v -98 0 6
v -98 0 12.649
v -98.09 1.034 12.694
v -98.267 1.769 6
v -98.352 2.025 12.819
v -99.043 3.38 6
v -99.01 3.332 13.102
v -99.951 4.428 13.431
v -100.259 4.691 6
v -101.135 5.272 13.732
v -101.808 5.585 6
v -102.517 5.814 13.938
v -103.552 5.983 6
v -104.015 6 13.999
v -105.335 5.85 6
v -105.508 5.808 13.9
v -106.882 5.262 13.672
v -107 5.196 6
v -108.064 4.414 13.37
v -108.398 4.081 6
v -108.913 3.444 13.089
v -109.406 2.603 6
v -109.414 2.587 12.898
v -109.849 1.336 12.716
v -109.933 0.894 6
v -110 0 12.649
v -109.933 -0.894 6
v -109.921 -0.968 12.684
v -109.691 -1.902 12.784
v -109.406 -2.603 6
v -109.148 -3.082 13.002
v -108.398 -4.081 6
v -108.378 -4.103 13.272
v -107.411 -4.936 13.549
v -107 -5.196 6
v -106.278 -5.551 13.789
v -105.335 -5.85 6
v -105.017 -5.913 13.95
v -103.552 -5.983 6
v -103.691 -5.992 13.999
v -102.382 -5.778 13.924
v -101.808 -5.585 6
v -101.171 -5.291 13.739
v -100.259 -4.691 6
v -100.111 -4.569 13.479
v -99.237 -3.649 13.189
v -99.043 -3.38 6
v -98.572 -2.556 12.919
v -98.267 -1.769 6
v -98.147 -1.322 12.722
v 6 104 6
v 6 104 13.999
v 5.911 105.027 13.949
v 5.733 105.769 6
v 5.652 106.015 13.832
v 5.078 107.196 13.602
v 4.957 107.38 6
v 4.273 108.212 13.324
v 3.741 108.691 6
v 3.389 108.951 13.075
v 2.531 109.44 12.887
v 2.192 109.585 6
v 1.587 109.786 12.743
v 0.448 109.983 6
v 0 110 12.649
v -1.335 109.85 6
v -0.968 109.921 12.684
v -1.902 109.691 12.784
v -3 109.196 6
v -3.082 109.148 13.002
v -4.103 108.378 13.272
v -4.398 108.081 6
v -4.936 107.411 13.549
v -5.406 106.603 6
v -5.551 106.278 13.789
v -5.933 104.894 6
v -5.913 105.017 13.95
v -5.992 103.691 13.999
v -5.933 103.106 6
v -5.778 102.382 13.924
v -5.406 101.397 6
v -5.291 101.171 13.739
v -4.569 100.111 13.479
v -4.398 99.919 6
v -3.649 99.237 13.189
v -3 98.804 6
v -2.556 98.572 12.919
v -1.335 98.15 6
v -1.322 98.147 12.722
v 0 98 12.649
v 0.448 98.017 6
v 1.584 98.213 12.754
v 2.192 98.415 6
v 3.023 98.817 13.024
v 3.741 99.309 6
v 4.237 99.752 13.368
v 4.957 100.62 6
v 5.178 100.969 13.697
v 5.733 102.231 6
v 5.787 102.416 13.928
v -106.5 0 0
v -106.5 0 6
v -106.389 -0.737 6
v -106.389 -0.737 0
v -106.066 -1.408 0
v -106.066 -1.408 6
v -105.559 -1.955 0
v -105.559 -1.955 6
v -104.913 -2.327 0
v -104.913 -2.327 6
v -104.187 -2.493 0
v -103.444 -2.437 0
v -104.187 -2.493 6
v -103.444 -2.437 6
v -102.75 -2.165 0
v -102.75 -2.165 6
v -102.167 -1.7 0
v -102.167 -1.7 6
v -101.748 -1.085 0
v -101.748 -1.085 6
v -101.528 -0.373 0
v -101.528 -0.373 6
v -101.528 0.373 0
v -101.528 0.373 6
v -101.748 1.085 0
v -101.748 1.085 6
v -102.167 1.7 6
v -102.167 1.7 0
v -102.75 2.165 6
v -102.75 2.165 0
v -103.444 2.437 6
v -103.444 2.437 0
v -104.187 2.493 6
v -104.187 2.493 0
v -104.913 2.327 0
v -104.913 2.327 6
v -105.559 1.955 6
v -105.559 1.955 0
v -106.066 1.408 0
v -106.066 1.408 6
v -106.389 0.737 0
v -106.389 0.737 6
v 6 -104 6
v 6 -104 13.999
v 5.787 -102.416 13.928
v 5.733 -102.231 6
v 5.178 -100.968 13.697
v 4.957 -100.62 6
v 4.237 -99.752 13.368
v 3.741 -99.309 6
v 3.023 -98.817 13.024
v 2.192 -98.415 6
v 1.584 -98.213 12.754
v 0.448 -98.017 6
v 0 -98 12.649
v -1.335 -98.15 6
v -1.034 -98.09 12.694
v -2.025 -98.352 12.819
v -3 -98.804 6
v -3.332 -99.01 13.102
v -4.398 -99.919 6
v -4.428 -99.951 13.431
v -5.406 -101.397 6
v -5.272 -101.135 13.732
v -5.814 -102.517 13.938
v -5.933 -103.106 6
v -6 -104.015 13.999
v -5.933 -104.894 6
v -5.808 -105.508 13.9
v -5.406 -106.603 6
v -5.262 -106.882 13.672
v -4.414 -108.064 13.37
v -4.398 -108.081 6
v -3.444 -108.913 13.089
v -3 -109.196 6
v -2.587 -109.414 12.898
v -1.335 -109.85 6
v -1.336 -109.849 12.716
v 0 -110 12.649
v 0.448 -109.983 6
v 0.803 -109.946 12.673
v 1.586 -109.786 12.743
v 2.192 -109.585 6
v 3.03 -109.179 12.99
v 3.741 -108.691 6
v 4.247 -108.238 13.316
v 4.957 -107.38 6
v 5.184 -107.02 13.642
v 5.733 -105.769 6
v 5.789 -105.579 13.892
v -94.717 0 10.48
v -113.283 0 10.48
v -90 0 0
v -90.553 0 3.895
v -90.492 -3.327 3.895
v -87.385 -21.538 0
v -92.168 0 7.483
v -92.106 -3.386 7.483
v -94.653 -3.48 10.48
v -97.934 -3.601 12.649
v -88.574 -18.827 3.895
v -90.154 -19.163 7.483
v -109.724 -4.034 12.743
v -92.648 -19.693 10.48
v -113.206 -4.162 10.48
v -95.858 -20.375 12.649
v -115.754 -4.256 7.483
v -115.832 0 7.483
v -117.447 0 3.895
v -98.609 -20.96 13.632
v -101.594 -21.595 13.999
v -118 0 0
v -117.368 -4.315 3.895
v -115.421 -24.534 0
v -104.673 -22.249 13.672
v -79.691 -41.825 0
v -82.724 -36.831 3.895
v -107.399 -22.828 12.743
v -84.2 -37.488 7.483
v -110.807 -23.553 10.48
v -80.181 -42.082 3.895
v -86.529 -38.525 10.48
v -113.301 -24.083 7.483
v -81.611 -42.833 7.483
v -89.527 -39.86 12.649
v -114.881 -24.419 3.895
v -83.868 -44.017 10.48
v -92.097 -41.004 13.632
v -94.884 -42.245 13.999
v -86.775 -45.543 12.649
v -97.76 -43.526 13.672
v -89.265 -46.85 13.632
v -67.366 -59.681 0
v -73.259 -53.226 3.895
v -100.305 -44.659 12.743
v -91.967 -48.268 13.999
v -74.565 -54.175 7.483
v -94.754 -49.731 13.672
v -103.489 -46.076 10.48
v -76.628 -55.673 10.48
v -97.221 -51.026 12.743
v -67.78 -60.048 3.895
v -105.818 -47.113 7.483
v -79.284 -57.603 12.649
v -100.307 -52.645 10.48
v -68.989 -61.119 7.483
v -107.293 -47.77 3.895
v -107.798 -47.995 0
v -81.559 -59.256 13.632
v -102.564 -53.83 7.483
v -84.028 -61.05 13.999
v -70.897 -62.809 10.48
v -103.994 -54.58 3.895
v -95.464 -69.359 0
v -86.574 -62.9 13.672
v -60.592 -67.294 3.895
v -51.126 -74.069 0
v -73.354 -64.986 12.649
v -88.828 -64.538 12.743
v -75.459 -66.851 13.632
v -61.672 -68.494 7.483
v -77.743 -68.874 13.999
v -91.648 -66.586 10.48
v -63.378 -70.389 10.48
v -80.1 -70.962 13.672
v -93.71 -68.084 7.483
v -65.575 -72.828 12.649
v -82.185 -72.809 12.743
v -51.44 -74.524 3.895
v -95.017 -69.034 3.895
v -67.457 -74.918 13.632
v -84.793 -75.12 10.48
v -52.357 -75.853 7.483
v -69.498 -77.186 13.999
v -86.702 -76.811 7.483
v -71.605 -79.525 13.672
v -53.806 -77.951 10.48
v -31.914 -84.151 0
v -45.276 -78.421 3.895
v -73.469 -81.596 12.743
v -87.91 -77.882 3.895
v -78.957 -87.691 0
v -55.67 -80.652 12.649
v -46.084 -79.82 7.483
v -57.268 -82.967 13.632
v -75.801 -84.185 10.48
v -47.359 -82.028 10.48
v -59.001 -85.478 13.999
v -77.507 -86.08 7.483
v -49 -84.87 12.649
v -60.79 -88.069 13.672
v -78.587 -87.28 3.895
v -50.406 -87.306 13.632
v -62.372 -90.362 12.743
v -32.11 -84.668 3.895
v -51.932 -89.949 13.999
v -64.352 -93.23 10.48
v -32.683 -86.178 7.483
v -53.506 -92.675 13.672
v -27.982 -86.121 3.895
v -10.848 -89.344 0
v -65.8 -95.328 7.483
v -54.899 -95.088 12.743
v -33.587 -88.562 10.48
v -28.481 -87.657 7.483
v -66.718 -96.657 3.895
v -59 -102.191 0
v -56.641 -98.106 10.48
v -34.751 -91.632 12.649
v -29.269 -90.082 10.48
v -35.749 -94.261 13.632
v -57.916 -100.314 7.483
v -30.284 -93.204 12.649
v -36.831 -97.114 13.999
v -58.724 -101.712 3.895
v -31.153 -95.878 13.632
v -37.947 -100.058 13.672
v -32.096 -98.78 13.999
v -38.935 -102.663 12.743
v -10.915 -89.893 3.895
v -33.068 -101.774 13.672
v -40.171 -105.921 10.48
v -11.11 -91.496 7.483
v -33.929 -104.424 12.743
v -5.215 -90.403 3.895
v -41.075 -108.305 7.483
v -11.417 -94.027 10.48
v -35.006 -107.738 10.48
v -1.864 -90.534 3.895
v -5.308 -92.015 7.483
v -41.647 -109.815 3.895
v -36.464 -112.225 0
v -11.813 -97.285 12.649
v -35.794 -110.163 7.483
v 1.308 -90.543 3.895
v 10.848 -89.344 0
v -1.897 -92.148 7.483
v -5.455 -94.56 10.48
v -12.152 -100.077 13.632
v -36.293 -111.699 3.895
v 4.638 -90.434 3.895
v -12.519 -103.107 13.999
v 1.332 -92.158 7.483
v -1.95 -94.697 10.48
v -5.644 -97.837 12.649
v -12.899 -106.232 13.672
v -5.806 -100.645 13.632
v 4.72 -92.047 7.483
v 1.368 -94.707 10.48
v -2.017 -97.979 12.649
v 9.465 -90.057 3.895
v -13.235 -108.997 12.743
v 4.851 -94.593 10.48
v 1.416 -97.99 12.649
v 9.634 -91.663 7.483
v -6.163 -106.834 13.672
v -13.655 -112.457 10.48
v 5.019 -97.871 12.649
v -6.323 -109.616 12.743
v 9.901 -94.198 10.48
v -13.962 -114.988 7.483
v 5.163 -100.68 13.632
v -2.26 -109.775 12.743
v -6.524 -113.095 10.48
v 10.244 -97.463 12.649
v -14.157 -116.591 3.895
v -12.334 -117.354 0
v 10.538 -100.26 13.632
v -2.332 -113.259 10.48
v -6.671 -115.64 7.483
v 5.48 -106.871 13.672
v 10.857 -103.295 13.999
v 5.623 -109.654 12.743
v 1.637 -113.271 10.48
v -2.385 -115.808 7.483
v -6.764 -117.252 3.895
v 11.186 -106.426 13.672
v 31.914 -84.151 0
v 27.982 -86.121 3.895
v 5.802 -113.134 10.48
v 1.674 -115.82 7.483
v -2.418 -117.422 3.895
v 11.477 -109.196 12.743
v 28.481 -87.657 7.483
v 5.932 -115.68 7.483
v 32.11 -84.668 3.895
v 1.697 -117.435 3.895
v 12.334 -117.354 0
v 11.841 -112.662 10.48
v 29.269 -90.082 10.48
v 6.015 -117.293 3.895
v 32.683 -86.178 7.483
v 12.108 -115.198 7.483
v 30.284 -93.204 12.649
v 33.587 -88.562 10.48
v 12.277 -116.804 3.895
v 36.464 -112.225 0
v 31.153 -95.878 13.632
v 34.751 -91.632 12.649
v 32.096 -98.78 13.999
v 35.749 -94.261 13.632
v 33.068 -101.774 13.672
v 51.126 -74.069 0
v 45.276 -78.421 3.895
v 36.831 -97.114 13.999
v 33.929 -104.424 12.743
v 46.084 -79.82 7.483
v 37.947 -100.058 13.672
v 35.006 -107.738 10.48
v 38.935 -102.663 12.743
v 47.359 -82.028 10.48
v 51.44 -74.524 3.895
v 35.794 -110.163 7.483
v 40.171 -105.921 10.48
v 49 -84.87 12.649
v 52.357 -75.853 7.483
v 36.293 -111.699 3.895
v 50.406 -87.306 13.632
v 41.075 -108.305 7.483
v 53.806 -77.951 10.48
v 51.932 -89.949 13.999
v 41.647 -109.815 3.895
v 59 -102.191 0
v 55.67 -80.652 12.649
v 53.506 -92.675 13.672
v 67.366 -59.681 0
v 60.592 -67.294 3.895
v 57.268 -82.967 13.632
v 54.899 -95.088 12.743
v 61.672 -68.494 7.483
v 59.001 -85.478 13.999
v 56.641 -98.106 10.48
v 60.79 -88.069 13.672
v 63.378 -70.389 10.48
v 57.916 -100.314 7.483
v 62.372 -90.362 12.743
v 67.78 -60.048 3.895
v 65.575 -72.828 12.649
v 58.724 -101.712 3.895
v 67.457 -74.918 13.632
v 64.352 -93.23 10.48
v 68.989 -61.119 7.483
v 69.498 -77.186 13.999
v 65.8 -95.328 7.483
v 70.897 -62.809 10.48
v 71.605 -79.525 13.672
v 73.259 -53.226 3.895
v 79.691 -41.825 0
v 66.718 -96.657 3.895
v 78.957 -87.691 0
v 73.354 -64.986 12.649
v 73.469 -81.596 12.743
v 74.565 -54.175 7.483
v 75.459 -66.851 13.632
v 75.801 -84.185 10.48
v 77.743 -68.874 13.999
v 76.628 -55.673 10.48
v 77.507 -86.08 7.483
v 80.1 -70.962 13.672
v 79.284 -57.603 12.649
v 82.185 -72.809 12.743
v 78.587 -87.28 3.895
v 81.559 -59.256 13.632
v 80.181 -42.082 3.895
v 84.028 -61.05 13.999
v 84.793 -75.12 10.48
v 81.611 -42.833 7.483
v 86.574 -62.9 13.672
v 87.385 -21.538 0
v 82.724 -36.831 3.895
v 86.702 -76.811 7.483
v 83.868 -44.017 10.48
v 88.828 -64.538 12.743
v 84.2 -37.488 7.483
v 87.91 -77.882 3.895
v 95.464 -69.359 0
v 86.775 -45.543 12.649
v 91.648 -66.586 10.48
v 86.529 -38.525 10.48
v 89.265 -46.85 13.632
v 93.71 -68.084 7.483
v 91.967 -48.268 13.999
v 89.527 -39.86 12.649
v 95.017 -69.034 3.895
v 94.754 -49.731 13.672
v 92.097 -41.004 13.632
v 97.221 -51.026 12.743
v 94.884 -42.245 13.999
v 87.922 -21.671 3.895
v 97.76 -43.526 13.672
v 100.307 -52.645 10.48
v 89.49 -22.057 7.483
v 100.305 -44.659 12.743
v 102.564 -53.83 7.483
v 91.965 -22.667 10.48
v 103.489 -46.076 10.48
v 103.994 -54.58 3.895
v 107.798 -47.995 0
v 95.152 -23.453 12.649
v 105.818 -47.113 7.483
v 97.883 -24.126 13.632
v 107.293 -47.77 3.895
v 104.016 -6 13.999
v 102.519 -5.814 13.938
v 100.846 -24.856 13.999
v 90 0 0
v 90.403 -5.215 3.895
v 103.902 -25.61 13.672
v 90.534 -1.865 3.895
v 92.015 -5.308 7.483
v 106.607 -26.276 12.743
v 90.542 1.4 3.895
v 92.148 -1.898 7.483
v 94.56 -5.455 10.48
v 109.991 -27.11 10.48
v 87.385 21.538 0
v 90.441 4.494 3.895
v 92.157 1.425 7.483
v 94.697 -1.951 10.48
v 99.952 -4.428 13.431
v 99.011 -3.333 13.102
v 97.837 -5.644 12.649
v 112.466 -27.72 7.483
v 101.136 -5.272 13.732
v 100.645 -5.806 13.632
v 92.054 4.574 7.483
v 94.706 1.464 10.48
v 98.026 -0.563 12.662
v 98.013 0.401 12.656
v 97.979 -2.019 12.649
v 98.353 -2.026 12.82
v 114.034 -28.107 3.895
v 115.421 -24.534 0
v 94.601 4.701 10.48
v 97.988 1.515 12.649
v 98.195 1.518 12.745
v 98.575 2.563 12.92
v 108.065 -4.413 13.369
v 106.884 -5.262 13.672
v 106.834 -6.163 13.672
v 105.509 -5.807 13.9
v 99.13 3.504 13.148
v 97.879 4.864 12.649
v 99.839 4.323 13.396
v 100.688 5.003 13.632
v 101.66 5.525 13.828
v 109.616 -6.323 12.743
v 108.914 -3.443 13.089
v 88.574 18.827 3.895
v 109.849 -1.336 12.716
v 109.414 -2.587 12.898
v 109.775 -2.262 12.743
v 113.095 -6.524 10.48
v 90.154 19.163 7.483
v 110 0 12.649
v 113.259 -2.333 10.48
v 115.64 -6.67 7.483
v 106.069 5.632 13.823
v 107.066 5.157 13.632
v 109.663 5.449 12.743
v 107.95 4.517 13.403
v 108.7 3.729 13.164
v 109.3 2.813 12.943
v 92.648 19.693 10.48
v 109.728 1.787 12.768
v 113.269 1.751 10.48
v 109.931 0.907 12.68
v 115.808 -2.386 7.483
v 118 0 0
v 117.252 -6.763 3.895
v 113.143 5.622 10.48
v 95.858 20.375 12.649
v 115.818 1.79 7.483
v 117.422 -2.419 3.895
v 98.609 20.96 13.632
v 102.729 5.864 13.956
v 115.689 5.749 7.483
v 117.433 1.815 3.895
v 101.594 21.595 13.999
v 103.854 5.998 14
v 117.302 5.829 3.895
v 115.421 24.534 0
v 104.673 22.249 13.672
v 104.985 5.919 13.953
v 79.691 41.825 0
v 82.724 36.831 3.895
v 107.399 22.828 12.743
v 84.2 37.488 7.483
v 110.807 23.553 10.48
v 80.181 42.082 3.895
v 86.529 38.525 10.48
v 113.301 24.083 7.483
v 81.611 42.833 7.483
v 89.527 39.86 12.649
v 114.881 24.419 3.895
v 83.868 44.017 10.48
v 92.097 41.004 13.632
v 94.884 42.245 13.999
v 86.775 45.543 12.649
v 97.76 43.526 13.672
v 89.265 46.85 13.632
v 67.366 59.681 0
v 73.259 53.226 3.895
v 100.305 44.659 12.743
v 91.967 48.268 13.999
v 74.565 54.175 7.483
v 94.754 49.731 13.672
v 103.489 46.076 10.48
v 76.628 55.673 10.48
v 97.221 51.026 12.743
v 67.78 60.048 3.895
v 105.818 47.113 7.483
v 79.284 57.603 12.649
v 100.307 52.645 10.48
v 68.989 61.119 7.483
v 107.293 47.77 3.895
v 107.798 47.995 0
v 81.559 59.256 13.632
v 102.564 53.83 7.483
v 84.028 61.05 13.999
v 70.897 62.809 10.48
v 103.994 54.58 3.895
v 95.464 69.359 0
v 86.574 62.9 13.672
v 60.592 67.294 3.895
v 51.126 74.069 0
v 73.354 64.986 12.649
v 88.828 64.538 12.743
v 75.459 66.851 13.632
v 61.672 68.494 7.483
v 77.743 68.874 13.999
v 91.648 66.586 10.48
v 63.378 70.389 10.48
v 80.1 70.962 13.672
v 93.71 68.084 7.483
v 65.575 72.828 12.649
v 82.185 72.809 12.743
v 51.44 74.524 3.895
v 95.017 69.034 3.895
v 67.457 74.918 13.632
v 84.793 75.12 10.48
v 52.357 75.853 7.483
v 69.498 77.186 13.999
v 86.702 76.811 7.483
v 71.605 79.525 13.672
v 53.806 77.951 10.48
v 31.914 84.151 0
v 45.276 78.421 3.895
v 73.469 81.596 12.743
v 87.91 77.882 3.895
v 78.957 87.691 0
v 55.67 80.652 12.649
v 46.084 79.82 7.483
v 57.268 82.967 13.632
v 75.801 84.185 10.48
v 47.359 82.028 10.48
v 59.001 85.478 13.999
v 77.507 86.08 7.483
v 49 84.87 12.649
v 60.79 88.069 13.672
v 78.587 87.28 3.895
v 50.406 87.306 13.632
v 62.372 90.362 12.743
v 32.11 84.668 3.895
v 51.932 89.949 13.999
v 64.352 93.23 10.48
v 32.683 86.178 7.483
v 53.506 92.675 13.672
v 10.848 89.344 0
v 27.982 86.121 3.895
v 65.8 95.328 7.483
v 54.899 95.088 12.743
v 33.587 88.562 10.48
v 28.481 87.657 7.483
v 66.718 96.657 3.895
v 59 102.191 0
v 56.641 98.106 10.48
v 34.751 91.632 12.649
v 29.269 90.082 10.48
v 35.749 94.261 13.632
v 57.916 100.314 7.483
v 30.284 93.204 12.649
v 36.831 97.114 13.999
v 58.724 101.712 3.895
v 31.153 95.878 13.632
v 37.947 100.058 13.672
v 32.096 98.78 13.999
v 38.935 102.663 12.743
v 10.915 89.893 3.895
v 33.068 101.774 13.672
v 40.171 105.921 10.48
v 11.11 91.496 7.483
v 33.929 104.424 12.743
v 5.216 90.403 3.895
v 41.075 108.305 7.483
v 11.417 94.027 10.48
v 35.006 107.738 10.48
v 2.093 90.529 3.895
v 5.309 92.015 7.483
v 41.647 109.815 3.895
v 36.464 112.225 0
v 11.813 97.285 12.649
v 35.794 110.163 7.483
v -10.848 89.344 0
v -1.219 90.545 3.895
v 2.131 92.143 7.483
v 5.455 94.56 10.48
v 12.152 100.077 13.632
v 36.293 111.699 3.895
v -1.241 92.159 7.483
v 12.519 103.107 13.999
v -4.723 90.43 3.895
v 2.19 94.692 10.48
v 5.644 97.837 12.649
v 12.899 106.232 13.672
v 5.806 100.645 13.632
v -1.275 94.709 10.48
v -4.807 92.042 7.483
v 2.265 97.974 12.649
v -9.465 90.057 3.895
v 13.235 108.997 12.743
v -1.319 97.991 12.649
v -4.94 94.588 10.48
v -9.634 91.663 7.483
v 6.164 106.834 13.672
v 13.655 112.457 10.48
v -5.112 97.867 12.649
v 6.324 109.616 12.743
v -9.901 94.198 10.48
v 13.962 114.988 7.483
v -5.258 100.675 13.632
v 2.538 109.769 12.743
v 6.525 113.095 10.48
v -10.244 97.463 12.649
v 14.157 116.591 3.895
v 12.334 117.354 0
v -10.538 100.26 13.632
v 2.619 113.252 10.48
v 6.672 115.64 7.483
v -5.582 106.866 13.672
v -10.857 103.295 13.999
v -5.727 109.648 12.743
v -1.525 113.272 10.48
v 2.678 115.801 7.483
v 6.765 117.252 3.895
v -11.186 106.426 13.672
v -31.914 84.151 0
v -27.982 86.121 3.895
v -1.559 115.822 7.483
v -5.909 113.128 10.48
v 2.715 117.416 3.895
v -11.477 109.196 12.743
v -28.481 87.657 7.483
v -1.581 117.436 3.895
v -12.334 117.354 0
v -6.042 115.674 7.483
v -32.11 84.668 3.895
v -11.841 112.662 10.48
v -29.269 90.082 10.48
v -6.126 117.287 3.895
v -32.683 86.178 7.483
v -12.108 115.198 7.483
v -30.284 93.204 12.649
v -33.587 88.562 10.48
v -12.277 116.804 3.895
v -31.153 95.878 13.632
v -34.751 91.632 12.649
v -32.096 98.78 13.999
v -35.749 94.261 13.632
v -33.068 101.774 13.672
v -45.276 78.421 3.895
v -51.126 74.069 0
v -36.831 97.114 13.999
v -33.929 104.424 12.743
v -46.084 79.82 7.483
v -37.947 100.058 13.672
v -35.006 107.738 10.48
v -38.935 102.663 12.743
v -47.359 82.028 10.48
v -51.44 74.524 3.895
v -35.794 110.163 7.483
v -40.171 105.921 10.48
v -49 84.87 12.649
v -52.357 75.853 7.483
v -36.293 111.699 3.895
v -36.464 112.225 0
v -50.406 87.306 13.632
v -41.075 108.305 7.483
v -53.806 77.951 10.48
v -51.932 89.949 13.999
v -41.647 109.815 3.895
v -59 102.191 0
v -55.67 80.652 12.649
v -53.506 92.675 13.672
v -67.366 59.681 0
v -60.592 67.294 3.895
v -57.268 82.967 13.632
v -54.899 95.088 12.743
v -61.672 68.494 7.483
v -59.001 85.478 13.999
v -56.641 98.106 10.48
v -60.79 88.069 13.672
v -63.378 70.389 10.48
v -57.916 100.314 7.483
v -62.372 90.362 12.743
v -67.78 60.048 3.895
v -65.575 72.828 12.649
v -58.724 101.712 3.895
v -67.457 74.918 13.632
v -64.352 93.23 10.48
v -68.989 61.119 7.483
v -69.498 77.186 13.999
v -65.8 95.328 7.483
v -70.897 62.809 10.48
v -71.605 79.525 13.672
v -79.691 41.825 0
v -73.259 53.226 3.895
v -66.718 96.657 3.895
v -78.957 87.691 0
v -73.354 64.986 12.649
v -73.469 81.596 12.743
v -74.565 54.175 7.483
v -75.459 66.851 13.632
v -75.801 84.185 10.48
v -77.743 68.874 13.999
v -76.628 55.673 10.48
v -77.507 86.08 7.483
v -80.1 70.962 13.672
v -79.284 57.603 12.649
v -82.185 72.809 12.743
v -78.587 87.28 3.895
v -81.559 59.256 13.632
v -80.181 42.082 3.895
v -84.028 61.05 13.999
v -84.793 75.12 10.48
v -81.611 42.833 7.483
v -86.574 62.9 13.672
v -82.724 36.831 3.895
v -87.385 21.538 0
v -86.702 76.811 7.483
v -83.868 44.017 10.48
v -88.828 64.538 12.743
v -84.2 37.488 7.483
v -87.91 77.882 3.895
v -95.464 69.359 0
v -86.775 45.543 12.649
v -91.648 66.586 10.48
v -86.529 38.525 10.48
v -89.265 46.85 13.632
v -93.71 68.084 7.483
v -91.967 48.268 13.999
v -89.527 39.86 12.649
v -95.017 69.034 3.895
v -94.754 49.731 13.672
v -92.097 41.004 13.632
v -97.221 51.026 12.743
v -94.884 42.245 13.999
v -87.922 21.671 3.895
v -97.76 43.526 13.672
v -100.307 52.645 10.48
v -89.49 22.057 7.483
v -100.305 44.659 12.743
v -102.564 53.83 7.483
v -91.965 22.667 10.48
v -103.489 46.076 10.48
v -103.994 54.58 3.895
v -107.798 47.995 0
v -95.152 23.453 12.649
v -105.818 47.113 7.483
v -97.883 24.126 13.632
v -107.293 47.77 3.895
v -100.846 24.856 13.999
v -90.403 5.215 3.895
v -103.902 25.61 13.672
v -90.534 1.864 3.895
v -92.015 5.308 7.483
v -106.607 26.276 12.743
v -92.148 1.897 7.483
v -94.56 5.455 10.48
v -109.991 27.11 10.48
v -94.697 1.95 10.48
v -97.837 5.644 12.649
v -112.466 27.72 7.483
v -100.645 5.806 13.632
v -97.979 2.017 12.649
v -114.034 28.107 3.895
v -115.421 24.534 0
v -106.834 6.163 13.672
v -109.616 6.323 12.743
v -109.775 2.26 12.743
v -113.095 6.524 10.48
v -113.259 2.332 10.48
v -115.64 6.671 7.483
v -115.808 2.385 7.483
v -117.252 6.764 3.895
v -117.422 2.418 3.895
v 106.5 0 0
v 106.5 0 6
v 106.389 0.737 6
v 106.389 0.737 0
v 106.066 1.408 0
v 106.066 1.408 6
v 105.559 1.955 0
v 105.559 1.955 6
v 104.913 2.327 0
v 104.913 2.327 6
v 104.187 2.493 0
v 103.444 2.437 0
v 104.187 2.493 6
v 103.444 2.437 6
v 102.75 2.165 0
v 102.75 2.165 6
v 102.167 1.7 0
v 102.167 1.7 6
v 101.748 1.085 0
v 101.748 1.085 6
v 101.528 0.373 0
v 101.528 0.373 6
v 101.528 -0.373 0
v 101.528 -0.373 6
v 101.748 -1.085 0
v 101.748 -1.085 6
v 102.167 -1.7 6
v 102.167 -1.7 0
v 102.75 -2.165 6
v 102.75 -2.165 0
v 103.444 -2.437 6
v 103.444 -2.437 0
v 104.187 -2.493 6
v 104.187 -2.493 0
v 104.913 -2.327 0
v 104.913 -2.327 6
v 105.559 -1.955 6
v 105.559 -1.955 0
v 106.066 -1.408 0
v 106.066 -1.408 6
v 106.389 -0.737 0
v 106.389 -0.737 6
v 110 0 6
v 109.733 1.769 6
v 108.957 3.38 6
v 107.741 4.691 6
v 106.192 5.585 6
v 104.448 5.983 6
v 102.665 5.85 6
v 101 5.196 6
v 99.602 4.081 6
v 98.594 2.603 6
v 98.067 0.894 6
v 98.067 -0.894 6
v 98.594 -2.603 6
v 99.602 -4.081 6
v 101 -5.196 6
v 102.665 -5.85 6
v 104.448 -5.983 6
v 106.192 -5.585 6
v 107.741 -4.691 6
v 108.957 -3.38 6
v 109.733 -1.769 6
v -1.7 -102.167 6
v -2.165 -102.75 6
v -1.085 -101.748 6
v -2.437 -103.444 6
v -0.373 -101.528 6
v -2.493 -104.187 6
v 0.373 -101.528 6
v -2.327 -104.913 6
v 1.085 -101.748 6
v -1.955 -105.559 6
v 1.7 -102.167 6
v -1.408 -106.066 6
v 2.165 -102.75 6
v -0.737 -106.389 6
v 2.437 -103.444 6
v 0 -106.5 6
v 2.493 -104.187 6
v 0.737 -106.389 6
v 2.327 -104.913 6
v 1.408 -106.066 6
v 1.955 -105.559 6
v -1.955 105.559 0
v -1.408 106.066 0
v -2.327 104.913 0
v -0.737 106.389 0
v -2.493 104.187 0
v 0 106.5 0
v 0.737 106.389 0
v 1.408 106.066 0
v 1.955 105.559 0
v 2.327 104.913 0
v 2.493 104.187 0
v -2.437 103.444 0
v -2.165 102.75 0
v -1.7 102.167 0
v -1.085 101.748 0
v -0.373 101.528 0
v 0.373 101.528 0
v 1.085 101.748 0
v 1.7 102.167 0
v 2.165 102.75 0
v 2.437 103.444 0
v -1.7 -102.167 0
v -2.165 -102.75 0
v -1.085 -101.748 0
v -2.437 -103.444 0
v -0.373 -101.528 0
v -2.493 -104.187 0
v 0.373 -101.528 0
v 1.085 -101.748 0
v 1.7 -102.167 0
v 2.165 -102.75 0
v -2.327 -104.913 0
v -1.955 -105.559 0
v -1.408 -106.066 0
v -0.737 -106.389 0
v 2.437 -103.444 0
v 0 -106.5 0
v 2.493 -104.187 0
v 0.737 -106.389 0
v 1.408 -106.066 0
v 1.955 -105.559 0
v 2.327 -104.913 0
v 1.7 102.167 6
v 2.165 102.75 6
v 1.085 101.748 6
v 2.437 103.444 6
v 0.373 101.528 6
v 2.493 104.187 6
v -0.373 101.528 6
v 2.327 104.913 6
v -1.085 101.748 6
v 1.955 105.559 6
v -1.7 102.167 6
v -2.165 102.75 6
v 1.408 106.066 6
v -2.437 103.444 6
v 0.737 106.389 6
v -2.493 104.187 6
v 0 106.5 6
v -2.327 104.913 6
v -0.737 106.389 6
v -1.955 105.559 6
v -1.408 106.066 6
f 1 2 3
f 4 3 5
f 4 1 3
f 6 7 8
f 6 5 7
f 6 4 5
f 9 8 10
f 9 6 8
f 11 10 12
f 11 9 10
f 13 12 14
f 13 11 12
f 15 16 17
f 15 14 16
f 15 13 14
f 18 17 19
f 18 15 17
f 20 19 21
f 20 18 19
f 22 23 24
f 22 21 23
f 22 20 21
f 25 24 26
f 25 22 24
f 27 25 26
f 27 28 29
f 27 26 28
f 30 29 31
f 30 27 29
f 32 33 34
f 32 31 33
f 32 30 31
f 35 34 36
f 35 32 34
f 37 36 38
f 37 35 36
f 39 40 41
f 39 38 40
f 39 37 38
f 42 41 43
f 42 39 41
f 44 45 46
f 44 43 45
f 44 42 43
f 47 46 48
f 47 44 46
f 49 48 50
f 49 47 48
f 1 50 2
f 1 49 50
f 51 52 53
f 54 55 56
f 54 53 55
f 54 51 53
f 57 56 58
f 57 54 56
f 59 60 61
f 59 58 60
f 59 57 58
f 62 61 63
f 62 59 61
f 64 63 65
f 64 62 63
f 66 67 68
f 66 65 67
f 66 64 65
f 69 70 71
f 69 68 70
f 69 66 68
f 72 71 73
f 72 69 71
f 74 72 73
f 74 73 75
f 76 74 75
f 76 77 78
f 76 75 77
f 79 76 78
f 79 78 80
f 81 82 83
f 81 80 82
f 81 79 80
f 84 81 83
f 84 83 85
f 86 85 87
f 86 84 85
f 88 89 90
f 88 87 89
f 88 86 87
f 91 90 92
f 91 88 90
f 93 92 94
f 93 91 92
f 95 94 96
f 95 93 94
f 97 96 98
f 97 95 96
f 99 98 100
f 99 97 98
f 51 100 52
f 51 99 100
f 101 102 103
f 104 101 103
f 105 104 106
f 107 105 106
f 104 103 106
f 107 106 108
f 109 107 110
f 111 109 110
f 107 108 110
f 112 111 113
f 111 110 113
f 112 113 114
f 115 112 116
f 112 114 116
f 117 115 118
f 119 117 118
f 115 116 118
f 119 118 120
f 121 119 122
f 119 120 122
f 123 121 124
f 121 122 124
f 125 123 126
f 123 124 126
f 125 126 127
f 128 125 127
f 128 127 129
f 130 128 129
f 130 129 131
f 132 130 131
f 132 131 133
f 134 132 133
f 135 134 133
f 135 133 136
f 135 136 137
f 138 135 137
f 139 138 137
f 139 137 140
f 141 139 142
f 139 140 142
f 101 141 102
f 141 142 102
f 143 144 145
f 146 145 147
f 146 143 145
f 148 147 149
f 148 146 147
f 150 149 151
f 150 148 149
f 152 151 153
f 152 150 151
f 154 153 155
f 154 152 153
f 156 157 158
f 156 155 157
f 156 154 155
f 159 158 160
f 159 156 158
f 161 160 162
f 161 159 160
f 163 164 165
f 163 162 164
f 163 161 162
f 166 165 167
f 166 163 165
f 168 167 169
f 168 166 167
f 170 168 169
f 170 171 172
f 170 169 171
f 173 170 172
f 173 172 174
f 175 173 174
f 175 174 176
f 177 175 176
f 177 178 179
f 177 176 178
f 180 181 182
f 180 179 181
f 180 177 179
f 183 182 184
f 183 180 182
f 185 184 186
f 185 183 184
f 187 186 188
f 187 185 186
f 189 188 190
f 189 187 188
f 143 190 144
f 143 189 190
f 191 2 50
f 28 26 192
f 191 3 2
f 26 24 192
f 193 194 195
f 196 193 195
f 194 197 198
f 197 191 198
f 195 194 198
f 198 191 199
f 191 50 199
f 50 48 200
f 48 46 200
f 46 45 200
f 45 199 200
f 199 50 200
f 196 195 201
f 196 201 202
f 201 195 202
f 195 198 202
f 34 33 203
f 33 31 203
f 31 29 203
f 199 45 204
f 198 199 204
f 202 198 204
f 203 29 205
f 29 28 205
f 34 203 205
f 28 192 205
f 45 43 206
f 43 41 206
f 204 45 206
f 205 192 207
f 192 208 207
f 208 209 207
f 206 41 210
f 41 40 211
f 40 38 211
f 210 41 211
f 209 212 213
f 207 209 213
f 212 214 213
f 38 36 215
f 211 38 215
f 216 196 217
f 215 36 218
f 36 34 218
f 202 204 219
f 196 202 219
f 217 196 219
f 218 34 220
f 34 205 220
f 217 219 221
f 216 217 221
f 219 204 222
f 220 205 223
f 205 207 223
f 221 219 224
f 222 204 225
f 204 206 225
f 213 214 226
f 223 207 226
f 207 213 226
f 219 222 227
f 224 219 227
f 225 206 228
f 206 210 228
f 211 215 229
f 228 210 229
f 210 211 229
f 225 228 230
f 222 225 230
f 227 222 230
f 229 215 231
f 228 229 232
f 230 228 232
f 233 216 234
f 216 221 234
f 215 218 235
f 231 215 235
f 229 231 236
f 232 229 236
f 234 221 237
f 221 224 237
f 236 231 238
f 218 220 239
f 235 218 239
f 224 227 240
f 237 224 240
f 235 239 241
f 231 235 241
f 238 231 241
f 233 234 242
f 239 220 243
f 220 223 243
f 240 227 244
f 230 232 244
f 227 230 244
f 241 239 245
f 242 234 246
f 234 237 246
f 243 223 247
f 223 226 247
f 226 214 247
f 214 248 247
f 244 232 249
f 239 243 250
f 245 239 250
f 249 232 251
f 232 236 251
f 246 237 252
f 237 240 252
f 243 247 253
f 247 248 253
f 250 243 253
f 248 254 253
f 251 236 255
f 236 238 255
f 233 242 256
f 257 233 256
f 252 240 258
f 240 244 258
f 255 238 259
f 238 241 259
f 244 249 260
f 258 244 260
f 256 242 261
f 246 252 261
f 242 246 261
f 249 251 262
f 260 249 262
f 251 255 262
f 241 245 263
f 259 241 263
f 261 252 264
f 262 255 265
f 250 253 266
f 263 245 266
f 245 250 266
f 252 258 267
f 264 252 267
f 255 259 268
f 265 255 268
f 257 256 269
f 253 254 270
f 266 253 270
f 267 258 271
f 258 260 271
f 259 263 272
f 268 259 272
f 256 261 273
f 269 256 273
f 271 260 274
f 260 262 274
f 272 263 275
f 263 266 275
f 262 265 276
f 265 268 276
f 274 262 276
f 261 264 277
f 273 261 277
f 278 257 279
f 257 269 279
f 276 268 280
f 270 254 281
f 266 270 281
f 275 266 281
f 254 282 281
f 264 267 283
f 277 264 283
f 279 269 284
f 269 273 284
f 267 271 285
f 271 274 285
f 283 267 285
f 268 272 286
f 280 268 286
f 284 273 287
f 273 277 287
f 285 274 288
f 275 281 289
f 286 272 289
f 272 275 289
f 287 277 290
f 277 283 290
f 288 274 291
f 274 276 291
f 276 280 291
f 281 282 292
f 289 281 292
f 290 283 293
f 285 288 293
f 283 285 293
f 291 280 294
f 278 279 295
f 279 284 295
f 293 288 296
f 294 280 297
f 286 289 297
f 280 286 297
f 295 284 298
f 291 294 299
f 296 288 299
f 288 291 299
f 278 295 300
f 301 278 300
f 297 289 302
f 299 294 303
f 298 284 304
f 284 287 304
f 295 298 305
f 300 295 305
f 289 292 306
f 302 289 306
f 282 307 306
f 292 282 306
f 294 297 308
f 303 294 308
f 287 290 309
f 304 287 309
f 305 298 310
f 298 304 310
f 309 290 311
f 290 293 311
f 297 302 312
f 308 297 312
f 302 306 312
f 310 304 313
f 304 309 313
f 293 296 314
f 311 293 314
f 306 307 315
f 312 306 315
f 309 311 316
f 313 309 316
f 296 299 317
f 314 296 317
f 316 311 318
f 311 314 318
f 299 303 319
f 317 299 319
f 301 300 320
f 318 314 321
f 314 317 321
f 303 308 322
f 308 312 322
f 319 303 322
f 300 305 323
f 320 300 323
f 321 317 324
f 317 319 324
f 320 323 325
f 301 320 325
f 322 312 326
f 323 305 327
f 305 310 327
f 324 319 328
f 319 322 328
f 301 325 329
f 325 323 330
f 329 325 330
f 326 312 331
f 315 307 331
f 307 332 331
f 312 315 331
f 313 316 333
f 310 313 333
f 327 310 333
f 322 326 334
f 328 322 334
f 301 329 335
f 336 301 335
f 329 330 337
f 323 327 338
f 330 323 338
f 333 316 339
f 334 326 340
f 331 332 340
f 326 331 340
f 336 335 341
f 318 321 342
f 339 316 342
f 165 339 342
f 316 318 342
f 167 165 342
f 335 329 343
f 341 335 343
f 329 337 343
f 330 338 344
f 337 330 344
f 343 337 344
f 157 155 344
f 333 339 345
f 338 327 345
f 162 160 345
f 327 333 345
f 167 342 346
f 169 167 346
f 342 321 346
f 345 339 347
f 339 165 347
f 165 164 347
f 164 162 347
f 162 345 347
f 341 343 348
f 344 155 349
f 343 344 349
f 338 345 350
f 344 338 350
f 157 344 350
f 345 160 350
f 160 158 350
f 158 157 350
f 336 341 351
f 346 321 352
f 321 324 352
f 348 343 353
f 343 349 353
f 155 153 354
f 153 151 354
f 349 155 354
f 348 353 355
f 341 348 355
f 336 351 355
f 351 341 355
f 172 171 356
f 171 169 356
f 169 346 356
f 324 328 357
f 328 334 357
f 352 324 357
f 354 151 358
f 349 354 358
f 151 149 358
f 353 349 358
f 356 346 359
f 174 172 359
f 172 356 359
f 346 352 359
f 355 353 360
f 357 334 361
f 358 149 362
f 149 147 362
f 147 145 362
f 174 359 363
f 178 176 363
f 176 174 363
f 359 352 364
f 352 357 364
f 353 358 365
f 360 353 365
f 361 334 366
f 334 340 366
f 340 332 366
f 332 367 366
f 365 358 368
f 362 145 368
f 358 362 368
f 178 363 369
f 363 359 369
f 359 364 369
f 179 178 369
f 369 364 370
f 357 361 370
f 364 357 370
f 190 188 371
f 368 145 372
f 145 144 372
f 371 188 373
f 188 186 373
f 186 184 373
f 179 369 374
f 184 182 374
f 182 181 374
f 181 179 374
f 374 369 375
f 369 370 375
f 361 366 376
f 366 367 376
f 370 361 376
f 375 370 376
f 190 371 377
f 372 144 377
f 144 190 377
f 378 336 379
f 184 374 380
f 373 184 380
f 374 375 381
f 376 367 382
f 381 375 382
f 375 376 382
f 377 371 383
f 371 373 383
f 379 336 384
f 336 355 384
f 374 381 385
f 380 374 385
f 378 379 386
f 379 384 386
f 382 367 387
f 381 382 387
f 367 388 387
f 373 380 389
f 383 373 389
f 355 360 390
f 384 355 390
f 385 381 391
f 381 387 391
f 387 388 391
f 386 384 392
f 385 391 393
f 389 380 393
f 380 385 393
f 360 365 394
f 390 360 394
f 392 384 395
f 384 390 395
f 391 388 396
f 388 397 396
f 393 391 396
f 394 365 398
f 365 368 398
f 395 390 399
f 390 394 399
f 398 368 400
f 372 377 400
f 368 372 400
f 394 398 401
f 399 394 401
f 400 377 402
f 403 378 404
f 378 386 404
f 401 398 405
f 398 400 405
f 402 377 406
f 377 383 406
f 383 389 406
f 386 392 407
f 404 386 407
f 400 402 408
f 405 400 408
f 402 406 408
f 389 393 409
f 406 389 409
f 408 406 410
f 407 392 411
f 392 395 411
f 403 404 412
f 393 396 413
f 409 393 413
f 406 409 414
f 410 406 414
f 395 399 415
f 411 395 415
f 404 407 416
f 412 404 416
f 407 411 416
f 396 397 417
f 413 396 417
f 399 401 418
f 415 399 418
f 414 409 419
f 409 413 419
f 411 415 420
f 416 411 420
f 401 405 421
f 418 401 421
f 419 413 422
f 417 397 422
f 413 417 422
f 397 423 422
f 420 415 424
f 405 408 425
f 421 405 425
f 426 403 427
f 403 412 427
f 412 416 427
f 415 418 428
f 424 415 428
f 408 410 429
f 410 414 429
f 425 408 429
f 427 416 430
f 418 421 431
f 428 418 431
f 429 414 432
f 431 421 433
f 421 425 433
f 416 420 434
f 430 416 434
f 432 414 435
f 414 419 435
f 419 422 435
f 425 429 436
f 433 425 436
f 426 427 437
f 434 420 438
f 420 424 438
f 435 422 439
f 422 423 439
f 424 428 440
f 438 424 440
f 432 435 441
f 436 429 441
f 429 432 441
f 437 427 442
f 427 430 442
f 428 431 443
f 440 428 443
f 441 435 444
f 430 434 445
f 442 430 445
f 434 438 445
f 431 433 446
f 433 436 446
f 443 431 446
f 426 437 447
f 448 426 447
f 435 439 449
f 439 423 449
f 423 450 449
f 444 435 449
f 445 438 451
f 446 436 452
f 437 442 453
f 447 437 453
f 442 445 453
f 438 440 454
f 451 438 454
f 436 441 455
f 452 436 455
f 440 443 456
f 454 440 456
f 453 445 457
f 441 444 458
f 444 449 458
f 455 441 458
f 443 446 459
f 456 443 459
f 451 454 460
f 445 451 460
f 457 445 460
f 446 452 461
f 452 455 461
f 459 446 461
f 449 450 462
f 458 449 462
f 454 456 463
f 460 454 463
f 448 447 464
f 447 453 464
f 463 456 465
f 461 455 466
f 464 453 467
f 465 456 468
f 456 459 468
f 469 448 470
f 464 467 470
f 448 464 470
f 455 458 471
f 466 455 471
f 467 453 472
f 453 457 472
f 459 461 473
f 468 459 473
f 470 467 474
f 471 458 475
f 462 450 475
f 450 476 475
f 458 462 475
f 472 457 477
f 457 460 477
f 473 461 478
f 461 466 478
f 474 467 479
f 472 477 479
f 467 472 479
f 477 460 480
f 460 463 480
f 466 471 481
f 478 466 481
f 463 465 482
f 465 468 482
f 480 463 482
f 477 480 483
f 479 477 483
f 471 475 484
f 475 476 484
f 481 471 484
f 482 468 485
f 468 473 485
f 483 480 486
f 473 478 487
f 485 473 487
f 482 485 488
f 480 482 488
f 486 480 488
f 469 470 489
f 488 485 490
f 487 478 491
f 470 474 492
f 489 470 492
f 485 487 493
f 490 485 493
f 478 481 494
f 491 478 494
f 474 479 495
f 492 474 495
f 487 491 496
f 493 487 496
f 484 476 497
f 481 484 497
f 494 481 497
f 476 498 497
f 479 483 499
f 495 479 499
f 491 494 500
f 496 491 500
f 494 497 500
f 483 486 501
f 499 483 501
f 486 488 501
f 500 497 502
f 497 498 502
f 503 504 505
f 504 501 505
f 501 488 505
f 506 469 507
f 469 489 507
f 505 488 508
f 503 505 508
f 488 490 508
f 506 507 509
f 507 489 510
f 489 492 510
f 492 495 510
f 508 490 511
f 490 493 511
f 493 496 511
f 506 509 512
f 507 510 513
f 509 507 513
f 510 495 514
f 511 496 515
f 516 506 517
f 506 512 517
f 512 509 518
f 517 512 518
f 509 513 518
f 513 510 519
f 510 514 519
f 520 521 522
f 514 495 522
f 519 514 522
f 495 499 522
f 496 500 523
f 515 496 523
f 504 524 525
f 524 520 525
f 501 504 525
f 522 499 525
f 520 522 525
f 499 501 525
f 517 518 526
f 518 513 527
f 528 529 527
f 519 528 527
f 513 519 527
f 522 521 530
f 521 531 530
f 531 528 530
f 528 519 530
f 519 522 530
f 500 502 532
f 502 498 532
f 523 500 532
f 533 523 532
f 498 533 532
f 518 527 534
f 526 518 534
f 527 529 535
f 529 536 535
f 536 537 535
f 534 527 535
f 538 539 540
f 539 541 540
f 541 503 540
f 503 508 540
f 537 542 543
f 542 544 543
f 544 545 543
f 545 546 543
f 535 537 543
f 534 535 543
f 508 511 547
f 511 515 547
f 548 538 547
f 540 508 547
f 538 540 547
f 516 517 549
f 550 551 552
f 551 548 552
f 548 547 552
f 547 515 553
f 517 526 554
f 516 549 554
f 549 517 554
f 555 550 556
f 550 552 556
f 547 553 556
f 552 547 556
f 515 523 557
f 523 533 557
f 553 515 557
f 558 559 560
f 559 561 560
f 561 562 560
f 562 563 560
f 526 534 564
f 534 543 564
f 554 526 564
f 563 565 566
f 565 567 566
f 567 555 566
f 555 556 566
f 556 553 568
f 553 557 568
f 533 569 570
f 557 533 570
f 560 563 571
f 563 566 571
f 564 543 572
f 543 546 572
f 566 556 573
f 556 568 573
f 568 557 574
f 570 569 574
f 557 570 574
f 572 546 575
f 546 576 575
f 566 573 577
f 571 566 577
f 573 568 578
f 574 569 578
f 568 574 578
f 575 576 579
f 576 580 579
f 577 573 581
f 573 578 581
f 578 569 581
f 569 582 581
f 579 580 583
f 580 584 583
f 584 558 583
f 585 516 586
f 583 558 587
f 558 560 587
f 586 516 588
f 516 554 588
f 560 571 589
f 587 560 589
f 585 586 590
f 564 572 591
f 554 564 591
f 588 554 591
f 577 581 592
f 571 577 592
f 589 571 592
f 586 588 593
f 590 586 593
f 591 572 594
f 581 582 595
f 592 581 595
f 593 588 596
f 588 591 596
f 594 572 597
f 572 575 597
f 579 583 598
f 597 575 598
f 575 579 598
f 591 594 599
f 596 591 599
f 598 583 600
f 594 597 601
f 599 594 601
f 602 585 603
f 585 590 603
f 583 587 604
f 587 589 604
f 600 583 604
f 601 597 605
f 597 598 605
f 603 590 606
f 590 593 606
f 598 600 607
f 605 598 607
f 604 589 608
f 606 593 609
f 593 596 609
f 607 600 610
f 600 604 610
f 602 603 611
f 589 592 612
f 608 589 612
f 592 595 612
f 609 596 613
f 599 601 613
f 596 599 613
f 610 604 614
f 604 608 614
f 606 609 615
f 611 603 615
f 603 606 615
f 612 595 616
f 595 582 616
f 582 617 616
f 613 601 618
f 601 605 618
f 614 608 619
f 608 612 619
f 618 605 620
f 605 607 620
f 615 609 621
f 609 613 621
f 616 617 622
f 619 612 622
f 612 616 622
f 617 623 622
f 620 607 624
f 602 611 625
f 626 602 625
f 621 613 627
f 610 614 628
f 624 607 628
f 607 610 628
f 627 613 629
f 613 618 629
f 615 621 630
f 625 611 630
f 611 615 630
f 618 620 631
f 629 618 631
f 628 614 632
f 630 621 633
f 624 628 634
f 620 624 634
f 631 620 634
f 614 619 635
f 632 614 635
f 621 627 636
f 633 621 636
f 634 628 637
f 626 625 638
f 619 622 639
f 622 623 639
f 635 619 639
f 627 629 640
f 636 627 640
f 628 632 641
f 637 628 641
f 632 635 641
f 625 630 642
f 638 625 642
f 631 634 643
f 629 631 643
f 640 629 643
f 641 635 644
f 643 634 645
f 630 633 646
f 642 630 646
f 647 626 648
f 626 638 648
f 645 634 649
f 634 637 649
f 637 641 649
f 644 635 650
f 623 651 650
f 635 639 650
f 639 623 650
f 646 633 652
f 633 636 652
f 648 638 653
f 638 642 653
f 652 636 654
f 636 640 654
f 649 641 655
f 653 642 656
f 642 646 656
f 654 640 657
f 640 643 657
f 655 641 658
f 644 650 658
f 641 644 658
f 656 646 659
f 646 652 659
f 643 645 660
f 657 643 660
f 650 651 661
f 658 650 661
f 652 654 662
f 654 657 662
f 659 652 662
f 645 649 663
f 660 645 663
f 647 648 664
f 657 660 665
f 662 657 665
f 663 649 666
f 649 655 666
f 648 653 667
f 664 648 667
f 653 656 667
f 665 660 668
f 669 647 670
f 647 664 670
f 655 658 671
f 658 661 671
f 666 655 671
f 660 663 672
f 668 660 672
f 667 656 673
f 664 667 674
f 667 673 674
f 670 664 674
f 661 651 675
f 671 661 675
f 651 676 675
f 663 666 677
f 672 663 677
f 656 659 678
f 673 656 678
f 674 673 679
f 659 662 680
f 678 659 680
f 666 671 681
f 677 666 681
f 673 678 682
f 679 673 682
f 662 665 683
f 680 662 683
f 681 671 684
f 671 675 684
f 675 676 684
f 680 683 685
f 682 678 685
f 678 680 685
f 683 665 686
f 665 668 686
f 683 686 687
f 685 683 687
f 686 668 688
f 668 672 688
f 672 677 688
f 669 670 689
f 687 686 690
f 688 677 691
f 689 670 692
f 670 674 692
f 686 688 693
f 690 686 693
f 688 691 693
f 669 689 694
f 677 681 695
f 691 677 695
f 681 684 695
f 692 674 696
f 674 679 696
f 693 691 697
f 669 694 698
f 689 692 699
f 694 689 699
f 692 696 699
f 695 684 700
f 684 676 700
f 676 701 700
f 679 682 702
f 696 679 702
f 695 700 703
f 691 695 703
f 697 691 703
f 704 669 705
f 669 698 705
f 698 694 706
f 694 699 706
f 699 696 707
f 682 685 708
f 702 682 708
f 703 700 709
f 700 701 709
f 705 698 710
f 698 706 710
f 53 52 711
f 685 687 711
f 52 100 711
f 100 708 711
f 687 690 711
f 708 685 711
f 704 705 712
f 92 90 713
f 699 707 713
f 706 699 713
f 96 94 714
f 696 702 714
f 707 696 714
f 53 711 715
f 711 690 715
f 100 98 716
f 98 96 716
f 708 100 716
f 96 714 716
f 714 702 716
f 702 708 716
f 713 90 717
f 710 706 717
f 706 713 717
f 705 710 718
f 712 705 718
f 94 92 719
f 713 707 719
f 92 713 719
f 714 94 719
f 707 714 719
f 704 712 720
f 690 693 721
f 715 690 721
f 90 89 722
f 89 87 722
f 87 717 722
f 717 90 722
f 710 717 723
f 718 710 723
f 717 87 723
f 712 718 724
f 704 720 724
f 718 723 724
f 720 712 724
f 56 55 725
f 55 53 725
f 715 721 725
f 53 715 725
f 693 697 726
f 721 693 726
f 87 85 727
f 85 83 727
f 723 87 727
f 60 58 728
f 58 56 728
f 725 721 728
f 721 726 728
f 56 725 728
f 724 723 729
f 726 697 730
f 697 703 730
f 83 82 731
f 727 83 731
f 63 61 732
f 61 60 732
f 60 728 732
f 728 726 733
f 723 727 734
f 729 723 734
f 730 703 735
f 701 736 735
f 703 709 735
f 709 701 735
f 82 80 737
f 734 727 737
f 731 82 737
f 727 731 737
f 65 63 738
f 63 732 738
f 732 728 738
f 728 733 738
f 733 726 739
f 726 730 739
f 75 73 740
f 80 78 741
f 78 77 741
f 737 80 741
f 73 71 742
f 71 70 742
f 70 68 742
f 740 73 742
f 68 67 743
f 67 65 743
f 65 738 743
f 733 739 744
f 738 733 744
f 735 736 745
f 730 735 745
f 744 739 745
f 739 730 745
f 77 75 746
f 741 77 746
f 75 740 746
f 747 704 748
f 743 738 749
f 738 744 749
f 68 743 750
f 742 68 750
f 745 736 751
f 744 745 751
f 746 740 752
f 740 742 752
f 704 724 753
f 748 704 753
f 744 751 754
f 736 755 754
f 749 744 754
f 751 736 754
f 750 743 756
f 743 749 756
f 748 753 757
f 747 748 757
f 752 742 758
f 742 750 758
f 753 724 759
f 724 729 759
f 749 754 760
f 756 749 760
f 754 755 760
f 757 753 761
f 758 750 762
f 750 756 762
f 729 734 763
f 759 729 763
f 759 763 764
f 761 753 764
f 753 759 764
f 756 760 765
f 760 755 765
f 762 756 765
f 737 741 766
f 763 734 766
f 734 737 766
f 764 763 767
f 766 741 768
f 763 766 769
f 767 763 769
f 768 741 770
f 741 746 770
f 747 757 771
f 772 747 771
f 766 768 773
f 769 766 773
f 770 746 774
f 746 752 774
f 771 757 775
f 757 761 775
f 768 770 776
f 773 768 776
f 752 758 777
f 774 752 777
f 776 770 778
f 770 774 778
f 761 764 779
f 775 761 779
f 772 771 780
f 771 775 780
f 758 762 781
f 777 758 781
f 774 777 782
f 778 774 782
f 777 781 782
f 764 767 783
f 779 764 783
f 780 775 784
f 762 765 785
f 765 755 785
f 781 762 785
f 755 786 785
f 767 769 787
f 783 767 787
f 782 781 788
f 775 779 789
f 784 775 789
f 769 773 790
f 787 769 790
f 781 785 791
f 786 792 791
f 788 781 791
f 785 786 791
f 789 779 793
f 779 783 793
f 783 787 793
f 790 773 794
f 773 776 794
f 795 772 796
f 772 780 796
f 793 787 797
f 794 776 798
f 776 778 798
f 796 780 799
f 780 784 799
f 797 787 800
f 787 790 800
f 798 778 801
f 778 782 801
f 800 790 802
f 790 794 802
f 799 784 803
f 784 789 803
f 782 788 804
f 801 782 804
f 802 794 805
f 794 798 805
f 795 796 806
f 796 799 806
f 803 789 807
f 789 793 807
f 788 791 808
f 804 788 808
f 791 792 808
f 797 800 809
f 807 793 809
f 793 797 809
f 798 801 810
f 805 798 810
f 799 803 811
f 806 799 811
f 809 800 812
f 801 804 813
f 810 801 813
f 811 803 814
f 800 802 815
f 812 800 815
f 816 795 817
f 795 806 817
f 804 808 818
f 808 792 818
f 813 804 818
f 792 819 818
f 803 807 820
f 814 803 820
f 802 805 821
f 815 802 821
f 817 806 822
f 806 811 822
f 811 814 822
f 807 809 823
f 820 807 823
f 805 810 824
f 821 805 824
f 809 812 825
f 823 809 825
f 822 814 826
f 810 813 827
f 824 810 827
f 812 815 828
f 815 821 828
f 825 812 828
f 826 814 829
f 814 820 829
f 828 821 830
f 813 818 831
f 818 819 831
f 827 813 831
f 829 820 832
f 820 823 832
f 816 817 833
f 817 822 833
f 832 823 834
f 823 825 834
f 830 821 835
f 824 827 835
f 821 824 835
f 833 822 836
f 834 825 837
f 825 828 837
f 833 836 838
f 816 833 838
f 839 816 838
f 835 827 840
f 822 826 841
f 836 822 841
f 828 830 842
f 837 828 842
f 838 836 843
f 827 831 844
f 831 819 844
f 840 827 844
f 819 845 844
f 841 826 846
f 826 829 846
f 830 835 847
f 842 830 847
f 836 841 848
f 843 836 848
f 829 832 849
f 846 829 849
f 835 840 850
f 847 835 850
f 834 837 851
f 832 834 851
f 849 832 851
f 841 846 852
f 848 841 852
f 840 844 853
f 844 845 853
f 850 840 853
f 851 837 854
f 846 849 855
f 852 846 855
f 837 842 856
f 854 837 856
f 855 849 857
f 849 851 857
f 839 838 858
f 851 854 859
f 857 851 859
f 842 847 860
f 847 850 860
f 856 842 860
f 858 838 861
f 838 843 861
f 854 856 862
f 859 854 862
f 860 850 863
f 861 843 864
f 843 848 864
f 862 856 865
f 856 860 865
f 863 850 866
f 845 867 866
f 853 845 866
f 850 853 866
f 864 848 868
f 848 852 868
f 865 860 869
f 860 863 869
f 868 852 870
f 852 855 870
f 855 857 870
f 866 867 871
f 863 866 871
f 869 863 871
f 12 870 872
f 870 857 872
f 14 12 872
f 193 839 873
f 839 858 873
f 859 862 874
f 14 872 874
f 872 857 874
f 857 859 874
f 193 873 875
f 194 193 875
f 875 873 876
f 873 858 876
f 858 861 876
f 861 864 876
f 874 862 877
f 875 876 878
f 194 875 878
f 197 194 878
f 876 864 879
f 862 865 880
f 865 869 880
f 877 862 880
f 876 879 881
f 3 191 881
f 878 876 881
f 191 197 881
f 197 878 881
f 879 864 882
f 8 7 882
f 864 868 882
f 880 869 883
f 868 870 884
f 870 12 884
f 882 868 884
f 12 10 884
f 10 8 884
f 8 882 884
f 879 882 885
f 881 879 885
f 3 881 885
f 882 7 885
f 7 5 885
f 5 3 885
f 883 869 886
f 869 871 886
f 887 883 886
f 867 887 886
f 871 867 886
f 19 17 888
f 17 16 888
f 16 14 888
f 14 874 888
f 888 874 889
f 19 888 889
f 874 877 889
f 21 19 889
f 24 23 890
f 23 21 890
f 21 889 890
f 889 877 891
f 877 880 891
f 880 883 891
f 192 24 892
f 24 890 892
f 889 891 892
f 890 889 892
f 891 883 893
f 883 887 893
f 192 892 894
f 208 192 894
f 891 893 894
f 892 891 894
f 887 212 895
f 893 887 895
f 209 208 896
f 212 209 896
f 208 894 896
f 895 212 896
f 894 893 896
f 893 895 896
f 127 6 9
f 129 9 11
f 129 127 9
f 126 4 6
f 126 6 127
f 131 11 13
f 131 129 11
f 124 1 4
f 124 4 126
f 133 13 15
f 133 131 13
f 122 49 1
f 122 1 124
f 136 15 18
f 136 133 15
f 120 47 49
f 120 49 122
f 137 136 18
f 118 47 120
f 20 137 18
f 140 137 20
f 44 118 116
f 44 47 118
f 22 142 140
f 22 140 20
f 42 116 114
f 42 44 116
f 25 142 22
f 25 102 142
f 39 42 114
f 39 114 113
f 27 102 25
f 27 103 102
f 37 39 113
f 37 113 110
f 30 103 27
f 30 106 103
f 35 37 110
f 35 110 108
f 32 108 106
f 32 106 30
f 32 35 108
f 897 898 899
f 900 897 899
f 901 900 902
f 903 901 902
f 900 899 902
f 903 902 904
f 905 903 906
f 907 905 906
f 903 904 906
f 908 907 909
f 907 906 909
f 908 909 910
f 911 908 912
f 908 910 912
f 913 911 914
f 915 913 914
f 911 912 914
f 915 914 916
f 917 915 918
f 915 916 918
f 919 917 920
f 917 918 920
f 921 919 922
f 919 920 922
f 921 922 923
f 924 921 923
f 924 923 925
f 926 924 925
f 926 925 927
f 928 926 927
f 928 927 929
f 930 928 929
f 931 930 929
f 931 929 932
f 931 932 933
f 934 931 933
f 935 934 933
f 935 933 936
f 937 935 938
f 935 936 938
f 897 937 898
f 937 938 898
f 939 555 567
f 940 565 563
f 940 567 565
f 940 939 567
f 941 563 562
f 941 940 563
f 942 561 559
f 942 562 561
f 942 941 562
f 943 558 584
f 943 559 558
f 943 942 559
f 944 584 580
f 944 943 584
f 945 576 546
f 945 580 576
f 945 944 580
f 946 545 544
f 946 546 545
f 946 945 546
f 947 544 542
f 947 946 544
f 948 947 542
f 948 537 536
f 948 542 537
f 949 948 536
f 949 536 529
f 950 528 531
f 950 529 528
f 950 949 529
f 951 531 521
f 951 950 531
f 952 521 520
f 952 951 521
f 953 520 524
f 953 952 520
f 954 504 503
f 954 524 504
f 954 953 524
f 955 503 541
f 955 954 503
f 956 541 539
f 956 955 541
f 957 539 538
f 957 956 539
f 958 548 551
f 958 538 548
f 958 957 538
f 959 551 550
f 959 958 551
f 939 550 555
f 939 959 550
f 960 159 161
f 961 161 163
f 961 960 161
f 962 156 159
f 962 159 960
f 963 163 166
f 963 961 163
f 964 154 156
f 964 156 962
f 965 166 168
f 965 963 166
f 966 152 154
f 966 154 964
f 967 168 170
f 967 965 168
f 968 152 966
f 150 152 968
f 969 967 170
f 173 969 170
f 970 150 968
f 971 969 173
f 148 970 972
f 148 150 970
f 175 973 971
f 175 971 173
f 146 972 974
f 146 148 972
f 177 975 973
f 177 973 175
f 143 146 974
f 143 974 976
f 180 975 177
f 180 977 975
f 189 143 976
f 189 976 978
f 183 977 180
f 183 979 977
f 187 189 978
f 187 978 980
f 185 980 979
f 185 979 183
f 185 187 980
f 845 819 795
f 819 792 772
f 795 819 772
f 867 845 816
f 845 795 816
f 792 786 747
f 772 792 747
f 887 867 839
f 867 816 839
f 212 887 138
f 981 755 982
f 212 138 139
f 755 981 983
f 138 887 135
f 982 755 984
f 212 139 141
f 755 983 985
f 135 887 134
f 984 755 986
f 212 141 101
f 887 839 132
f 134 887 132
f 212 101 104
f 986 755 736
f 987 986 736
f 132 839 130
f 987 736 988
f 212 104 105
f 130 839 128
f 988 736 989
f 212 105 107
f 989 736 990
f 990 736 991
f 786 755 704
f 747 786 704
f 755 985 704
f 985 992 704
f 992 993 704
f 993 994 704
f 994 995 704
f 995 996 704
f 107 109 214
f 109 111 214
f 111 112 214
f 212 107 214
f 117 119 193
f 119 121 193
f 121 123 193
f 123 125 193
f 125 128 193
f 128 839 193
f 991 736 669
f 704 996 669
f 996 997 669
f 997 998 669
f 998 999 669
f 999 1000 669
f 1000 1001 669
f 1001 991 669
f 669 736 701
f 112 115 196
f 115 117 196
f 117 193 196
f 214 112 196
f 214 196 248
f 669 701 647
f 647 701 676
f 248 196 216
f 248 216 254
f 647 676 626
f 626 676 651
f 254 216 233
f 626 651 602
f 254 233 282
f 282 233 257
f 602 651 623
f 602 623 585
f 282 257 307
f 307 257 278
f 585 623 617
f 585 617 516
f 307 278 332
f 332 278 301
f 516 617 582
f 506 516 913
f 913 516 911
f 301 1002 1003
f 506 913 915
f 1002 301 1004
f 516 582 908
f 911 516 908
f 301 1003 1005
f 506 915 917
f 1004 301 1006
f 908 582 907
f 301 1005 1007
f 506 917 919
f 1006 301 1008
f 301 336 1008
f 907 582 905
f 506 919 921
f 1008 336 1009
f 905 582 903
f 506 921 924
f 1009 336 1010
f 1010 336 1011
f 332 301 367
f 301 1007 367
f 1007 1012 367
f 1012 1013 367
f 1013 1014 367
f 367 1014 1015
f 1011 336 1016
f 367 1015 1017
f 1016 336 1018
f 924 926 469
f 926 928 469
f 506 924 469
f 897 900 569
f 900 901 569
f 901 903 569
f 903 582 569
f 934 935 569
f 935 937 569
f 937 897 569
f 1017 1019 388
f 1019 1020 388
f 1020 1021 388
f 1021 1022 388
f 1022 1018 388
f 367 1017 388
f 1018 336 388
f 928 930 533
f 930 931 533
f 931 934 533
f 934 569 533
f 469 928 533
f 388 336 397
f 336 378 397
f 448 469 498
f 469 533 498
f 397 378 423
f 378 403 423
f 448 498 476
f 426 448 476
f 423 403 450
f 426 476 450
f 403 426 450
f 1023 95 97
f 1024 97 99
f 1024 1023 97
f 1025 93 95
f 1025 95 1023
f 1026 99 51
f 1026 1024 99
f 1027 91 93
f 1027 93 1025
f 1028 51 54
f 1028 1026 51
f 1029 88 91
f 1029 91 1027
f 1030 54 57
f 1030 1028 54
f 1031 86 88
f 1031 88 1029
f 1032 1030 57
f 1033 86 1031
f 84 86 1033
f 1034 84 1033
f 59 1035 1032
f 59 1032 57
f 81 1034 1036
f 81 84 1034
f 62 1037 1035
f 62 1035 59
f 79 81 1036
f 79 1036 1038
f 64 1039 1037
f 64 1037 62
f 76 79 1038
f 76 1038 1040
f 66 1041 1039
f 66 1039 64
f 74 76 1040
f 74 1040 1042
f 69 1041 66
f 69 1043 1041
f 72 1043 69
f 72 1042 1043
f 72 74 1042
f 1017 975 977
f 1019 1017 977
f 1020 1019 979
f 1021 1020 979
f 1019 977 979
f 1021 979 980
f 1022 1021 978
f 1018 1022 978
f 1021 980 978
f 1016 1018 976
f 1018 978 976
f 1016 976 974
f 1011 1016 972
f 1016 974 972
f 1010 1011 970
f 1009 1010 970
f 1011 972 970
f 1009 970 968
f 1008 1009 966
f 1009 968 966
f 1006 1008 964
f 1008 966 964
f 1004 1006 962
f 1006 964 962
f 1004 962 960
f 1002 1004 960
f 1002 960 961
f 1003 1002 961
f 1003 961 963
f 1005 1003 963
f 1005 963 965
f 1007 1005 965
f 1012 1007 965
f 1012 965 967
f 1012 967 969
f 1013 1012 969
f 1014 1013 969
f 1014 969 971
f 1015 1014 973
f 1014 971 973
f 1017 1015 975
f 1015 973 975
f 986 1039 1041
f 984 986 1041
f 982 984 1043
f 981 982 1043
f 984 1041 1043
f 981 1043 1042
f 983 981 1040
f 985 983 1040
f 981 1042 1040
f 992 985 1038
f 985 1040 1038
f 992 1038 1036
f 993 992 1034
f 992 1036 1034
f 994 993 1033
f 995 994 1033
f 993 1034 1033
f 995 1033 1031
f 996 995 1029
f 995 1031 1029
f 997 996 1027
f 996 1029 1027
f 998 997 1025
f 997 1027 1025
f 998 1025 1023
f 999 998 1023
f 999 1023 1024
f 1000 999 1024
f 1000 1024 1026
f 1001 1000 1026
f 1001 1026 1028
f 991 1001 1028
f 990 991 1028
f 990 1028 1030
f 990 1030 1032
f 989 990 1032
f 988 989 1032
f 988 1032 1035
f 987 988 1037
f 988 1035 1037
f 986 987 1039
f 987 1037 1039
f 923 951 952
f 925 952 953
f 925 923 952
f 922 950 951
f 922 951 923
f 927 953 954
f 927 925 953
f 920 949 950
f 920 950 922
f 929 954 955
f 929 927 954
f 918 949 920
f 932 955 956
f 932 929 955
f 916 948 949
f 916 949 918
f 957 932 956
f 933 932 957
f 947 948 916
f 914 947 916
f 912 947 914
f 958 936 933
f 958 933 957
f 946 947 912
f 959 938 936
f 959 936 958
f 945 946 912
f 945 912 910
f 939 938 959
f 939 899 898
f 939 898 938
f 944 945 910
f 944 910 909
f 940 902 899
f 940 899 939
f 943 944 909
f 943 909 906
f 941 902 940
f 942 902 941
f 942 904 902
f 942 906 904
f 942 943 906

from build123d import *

# Parameters (mm, degrees)
F2_R     = 6
F3_DEPTH = 14
F5_R     = 6
F5_R_2   = 2.5
F6_DEPTH = 6
F7_COUNT = 4


with BuildPart() as f1:
    # F0 (on Front) → F1 (revolve)
    with BuildSketch(Plane.XZ):
        with BuildLine():
            Line((-118, 0), (-90, 0))
            ThreePointArc((-90, 0), (-104, 14), (-118, 0))
        make_face()
    revolve(axis=Axis((0, 0, 34.595653), (0, 0, 1)))

    # F2 (on Top) → F3 (cut)
    with BuildSketch(Plane.XY):
        with Locations((0, -104)):
            Circle(F2_R)
        with Locations((104, 0)):
            Circle(F2_R)
        with Locations((0, 104)):
            Circle(F2_R)
        with Locations((-104, 0)):
            Circle(F2_R)
    extrude(amount=F3_DEPTH, mode=Mode.SUBTRACT)

    # F5 (on offset) → F6 (join)
    with BuildSketch(Plane.XY.offset(6)):
        with Locations((104, 0)):
            Circle(F5_R)
        with Locations((104, 0)):
            Circle(F5_R_2, mode=Mode.SUBTRACT)
    extrude(amount=-F6_DEPTH)

    # F7: F1 ×4 about axis
    f7_axis = Axis((0, 0, 34.595653), (0, 0, 1))


with BuildPart() as f1_1:
    add(f1.part)
    for i in range(1, F7_COUNT):
        add(f1.part.rotate(f7_axis, i * 360 / F7_COUNT))


solid = f1_1.part
